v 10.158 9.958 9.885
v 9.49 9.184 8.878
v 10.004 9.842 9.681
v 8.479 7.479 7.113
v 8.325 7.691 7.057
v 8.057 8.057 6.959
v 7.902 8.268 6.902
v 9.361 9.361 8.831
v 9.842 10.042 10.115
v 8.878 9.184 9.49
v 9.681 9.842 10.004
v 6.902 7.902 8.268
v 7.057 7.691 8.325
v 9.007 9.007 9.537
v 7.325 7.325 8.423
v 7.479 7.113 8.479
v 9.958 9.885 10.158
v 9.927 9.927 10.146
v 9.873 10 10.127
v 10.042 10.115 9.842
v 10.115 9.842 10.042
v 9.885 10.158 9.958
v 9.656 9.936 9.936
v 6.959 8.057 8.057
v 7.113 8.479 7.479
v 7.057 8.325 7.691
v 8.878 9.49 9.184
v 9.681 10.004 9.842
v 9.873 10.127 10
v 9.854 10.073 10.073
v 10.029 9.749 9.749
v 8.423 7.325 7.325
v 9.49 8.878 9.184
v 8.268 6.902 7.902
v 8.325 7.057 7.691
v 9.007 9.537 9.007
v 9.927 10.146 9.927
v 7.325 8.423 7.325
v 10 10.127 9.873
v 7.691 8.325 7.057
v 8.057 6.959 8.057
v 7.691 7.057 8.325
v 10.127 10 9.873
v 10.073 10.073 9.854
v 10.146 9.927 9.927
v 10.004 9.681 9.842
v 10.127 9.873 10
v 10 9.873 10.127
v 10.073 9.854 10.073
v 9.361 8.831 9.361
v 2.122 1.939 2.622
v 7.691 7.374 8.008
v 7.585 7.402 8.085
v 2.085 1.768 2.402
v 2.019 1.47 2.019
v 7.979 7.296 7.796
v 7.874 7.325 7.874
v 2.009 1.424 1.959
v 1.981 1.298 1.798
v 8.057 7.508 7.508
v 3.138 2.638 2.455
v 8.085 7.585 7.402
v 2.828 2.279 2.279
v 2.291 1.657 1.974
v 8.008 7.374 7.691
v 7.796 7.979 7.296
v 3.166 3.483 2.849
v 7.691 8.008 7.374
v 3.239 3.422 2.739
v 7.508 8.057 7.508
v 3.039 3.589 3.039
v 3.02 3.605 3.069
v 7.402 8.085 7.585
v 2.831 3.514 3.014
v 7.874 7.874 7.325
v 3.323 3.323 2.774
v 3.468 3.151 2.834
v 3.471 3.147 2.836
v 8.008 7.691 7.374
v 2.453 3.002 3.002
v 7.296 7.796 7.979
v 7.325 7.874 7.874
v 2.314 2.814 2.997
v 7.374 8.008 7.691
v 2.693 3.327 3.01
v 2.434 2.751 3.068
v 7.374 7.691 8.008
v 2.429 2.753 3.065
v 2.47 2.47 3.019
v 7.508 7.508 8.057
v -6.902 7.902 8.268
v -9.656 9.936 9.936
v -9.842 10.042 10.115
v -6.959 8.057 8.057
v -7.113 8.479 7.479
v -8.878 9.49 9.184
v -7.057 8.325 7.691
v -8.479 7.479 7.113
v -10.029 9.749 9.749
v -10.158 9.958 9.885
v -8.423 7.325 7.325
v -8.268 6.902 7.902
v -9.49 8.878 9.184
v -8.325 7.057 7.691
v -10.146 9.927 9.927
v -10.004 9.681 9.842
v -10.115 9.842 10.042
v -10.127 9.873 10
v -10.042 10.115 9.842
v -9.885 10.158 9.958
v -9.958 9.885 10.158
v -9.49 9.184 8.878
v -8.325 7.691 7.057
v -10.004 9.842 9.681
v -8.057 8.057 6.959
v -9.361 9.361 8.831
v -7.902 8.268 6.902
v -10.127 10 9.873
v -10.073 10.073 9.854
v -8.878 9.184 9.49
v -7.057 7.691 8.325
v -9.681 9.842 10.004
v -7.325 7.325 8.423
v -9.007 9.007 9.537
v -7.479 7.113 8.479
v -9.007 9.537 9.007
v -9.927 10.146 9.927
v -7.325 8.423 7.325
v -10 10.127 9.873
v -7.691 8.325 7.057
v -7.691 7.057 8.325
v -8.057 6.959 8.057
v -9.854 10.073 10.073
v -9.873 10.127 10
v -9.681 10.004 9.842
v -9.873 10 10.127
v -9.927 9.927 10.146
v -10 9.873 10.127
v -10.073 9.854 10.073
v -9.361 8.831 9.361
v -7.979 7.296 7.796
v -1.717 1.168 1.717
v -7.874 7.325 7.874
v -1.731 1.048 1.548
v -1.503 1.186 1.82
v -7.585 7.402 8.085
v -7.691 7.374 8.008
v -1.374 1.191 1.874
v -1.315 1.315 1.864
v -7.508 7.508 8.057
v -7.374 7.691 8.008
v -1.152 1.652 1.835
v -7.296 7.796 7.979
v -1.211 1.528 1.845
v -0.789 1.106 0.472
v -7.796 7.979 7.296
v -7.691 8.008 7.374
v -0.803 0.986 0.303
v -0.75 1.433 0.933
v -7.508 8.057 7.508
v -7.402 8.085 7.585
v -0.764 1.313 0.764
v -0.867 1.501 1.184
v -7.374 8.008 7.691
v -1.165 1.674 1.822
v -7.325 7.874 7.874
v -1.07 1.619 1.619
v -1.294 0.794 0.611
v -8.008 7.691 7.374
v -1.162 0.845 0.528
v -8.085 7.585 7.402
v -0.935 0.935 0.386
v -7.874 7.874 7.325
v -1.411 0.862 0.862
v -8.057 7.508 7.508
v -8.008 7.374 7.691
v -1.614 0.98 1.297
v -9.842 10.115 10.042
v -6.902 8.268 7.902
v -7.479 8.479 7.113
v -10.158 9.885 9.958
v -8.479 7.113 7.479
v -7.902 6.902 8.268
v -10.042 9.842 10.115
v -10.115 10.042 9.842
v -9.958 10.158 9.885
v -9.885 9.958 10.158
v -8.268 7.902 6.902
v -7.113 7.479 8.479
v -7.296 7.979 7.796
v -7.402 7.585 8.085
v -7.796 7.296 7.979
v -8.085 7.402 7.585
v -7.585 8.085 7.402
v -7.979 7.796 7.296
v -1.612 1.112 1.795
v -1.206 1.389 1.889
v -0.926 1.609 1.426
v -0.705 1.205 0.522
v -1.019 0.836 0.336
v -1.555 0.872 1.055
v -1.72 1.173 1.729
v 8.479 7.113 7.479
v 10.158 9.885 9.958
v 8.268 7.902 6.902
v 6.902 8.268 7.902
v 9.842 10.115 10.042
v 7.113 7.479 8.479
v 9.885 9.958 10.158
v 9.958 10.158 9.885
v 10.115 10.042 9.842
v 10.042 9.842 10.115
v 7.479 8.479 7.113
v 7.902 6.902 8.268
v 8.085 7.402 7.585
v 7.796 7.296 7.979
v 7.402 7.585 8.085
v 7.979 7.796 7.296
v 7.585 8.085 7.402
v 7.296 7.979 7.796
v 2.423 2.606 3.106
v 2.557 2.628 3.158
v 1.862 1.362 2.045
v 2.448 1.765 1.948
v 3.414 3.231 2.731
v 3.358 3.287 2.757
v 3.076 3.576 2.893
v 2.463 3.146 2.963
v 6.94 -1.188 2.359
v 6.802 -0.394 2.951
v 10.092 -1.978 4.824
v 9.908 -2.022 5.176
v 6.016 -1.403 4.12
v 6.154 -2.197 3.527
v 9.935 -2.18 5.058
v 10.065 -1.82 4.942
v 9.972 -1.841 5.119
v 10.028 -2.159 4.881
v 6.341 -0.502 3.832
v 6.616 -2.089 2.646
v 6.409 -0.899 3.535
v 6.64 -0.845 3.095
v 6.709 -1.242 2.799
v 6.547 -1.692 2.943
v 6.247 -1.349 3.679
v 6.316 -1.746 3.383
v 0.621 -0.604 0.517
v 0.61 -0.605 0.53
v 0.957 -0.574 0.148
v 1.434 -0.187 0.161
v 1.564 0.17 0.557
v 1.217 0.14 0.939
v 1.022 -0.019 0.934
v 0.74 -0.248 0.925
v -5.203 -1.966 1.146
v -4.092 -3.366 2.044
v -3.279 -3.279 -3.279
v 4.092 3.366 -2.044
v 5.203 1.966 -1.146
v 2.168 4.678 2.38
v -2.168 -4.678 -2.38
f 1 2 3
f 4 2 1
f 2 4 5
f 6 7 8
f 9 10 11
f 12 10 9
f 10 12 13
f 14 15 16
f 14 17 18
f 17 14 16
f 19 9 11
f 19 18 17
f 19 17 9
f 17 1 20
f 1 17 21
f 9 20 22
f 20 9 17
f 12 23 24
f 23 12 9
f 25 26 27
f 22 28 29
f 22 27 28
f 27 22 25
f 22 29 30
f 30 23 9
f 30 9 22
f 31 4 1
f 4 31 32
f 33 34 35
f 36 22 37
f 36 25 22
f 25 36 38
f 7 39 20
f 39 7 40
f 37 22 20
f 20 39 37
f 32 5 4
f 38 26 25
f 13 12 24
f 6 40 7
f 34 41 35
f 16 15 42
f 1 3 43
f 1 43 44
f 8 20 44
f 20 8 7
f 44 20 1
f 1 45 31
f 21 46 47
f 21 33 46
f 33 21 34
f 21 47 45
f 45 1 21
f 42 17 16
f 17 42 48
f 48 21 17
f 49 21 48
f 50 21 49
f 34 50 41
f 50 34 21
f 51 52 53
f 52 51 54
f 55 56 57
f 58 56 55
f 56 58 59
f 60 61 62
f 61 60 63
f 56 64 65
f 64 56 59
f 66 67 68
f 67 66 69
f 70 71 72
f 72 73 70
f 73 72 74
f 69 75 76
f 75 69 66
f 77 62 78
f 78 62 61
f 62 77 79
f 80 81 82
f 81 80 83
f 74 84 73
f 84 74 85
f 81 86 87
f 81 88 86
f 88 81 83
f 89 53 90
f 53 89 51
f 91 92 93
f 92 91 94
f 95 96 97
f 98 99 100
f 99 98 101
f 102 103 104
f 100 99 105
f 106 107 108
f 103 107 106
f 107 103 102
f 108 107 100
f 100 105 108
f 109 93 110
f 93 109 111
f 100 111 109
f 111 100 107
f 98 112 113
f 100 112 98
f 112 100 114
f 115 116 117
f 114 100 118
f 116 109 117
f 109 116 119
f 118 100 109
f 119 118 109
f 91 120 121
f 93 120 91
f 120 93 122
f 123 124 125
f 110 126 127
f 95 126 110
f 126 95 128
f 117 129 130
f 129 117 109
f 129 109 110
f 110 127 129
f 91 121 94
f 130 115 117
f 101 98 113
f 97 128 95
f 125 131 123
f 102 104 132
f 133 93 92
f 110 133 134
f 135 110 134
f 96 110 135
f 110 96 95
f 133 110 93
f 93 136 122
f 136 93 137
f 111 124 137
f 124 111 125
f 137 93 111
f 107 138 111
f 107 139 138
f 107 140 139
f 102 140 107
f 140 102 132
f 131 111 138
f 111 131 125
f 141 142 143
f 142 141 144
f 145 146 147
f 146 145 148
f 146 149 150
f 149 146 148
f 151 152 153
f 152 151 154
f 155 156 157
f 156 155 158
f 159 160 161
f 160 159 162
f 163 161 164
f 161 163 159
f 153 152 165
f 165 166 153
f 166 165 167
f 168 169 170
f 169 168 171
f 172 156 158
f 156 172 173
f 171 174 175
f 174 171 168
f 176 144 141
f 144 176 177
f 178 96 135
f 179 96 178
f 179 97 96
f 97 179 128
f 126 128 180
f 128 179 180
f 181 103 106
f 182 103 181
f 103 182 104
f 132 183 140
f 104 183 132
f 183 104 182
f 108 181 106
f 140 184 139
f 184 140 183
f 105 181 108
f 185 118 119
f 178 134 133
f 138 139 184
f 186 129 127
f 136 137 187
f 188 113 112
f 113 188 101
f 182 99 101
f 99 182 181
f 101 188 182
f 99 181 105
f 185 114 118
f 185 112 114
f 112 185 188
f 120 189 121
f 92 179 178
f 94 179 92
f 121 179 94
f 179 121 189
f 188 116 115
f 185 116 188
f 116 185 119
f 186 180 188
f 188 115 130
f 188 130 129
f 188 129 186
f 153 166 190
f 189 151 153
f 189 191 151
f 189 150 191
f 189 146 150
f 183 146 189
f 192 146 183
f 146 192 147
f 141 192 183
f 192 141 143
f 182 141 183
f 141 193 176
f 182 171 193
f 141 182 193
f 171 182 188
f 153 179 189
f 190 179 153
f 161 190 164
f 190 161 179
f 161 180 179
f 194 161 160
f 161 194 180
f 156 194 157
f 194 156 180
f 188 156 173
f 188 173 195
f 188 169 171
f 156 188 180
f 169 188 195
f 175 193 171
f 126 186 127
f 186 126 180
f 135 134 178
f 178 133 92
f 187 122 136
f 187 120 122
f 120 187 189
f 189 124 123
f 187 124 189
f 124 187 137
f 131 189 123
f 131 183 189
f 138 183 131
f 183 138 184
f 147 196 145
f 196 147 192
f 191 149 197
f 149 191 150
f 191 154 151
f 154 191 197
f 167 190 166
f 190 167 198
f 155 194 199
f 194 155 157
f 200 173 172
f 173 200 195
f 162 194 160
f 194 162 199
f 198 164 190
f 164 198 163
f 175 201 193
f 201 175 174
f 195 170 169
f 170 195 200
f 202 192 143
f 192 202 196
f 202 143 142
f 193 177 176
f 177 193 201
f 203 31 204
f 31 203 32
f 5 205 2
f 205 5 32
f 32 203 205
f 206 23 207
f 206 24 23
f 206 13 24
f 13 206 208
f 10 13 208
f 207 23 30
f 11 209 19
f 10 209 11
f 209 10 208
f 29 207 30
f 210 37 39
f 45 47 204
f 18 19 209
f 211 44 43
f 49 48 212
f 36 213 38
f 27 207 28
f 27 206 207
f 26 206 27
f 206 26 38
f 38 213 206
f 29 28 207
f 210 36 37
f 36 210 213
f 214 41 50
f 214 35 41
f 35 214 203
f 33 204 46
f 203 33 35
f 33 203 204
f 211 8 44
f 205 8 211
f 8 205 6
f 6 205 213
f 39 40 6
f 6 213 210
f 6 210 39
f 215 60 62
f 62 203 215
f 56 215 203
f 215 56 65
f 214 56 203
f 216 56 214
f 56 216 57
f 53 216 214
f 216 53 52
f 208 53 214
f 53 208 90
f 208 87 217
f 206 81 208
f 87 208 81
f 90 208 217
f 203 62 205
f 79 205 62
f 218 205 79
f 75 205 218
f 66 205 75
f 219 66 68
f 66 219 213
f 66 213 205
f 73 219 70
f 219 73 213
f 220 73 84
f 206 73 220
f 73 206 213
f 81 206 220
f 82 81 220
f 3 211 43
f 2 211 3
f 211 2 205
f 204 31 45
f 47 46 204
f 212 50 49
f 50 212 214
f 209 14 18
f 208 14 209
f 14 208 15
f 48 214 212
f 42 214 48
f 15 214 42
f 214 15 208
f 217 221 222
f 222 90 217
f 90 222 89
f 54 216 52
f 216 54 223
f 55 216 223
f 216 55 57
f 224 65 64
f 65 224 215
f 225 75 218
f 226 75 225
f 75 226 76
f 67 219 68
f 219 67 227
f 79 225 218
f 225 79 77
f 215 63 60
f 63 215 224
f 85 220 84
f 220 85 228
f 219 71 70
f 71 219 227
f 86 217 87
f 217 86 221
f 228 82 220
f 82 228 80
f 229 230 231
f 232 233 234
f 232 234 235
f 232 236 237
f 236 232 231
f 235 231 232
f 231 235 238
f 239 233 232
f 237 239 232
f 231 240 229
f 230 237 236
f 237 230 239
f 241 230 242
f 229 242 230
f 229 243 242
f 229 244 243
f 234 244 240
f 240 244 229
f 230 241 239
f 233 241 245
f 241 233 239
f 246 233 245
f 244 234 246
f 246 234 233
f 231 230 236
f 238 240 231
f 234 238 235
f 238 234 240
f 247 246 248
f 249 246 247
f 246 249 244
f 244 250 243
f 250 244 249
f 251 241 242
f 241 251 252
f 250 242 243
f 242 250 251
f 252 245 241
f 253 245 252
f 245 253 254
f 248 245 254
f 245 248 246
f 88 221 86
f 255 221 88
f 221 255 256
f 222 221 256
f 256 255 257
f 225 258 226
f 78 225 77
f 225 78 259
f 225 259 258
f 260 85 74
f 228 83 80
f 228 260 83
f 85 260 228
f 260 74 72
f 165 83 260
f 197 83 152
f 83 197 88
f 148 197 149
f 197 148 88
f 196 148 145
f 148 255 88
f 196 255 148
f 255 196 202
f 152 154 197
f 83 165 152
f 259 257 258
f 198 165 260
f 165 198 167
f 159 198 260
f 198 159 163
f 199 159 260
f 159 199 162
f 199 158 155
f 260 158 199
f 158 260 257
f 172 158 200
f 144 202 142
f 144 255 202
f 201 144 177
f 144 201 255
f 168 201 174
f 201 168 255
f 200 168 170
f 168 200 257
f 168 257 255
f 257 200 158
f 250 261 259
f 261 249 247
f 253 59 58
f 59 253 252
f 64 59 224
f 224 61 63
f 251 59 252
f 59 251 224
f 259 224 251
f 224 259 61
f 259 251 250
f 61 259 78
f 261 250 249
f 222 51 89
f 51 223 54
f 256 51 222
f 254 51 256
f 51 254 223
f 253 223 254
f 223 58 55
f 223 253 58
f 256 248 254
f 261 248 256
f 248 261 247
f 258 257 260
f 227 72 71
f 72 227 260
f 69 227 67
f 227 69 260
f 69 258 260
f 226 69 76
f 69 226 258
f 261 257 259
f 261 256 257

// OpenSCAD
//---------------------------------------------------------------
//-- Openscad vector library
//-- This is a component of the obiscad opescad tools by Obijuan
//-- (C) Juan Gonzalez-Gomez (Obijuan)
//-- Sep-2012
//---------------------------------------------------------------
//-- Released under the GPL license
//---------------------------------------------------------------

obiscad_drawing_resolution = 6;

//----------------------------------------
//-- FUNCTIONS FOR WORKING WITH VECTORS
//----------------------------------------

//-- Calculate the module of a vector
function mod(v) = (sqrt(v[0]*v[0]+v[1]*v[1]+v[2]*v[2]));

//-- Calculate the cros product of two vectors
function cross(u,v) = [
  u[1]*v[2] - v[1]*u[2],
  -(u[0]*v[2] - v[0]*u[2]) ,
  u[0]*v[1] - v[0]*u[1]];

//-- Calculate the dot product of two vectors
function dot(u,v) = u[0]*v[0]+u[1]*v[1]+u[2]*v[2];

//-- Return the unit vector of a vector
function unitv(v) = v/mod(v);

//-- Return the angle between two vectores
function anglev(u,v) = acos( dot(u,v) / (mod(u)*mod(v)) );

//----------------------------------------------------------
//--  Draw a point in the position given by the vector p  
//----------------------------------------------------------
module point(p)
{
  translate(p)
    sphere(r=0.7,$fn=obiscad_drawing_resolution);
}

//------------------------------------------------------------------
//-- Draw a vector poiting to the z axis
//-- This is an auxiliary module for implementing the vector module
//--
//-- Parameters:
//--  l: total vector length (line + arrow)
//--  l_arrow: Vector arrow length
//--  mark: If true, a mark is draw in the vector head, for having
//--    a visual reference of the rolling angle
//------------------------------------------------------------------
module vectorz(l=10, l_arrow=4, mark=false)
{
  //-- vector body length (not including the arrow)
  lb = l - l_arrow;

  //-- The vector is locatead at 0,0,0
  translate([0,0,lb/2])
  union() {

    //-- Draw the arrow
    translate([0,0,lb/2])
      cylinder(r1=2/2, r2=0.2, h=l_arrow, $fn=obiscad_drawing_resolution);

    //-- Draw the mark
    if (mark) {
      translate([0,0,lb/2+l_arrow/2])
      translate([1,0,0])
        cube([2,0.3,l_arrow*0.8],center=true);
    }

    //-- Draw the body
    cylinder(r=1/2, h=lb, center=true, $fn=obiscad_drawing_resolution);
  }

  //-- Draw a sphere in the vector base
  sphere(r=1/2, $fn=obiscad_drawing_resolution);
}

//-----------------------------------------------------------------
//-- ORIENTATE OPERATOR
//--
//--  Orientate an object to the direction given by the vector v
//--  Parameters:
//--    v : Target orientation
//--    vref: Vector reference. It is the vector of the local frame
//--          of the object that want to be pointing in the direction
//--          of v
//--    roll: Rotation of the object around the v axis
//-------------------------------------------------------------------
module orientate(v,vref=[0,0,1], roll=0)
{
  //-- Calculate the rotation axis
  raxis = cross(vref,v);
  
  //-- Calculate the angle between the vectors
  ang = anglev(vref,v);

  //-- Rotate the child!
  rotate(a=roll, v=v)
    rotate(a=ang, v=raxis)
      child(0);
}

//---------------------------------------------------------------------------
//-- Draw a vector 
//--
//-- There are two modes of drawing the vector
//-- * Mode 1: Given by a cartesian point(x,y,z). A vector from the origin
//--           to the end (x,y,z) is drawn. The l parameter (length) must 
//--           be 0  (l=0)
//-- * Mode 2: Give by direction and length
//--           A vector of length l pointing to the direction given by
//--           v is drawn
//---------------------------------------------------------------------------
//-- Parameters:
//--  v: Vector cartesian coordinates
//--  l: total vector length (line + arrow)
//--  l_arrow: Vector arrow length
//    mark: If true, a mark is draw in the vector head, for having
//--    a visual reference of the rolling angle
//---------------------------------------------------------------------------
module vector(v,l=0, l_arrow=4, mark=false)
{
  //-- Get the vector length from the coordinates
  mod = mod(v);

  //-- The vector is very easy implemented by means of the orientate
  //-- operator:
  //--  orientate(v) vectorz(l=mod, l_arrow=l_arrow)
  //--  BUT... in OPENSCAD 2012.02.22 the recursion does not
  //--    not work, so that if the user use the orientate operator
  //--    on a vector, openscad will ignore it..
  //-- The solution at the moment (I hope the openscad developers
  //--  implement the recursion in the near future...)
  //--  is to repite the orientate operation in this module

  //---- SAME CALCULATIONS THAN THE ORIENTATE OPERATOR!
  //-- Calculate the rotation axis

  vref = [0,0,1];
  raxis = cross(vref,v);
  
  //-- Calculate the angle between the vectors
  ang = anglev(vref,v);

  //-- orientate the vector
  //-- Draw the vector. The vector length is given either
  //--- by the mod variable (when l=0) or by l (when l!=0)
  if (l==0)
    rotate(a=ang, v=raxis)
      vectorz(l=mod, l_arrow=l_arrow, mark=mark);
  else
    rotate(a=ang, v=raxis)
      vectorz(l=l, l_arrow=l_arrow, mark=mark);

}

//----------------------------------------------------
//-- Draw a Frame of reference
//-- Parameters:
//-- l: length of the Unit vectors
//-----------------------------------------------------
module frame(l=10, l_arrow=4)
{

  //-- Z unit vector
  color("Blue")
    vector([0,0,l], l_arrow=l_arrow);

  //-- X unit vector
  color("Red")
    vector([l,0,0], l_arrow=l_arrow );

  //-- Y unit vector
  color("Green")
    vector([0,l,0],l_arrow=l_arrow);

  //-- Origin
  color("Gray")
    sphere(r=1, $fn=obiscad_drawing_resolution);
}

//--------------------------------------------------
//-- Modules for testings and examples
//-- Testing that the vector library is working ok
//--------------------------------------------------

//-- 22 vectors in total are drawn, poiting to different directions
module Test_vectors1()
{

  a = 20;
  k = 1;

  //--  Add a frame of reference (in the origin)
  frame(l=a);

  //-- Negative vectors, pointing towards the three axis: -x, -y, -z
  color("Red")   vector([-a, 0,  0]);
  color("Green") vector([0, -a,  0]);
  color("Blue")  vector([0,  0, -a]);

  //-- It is *not* has been implemented using a for loop on purpose
  //-- This way, individual vectors can be commented out or highlighted

  //-- vectors with positive z
  vector([a,   a, a*k]);
  vector([0,   a, a*k]);
  vector([-a,  a, a*k]);
  vector([-a,  0, a*k]);

  vector([-a, -a, a*k]);
  vector([0,  -a, a*k]);
  vector([a,  -a, a*k]);
  vector([a,   0, a*k]);


  //-- Vectors with negative z
  vector([a,   a, -a*k]);
  vector([0,   a, -a*k]);
  vector([-a,  a, -a*k]);
  vector([-a,  0, -a*k]);

  vector([-a, -a, -a*k]);
  vector([0,  -a, -a*k]);
  vector([a,  -a, -a*k]);
  vector([a,   0, -a*k]);
}

//--- Another test...
module Test_vectors2()
{

  //-- Add the vector into the vector table
  //-- This vectors are taken as directions
  //-- All the vectors will be drawn with the same length (l)
  vector_table = [
    [1,   1, 1],
    [0,   1, 1],
    [-1,  1, 1],
    [-1,  0, 1],
    [-1, -1, 1],
    [0,  -1, 1],
    [1,  -1, 1],
    [1,   0, 1],
  
    [1,   1, -1],
    [0,   1, -1],
    [-1,  1, -1],
    [-1,  0, -1],
    [-1, -1, -1],
    [0,  -1, -1],
    [1,  -1, -1],
    [1,   0, -1],
  ];

  //-- Vector length
  l=20;

  frame(l=10);

  //-- Draw all the vector given in the table
  //-- The vectors point to the direction given in the table
  //-- They all are drawn with a length equal to l
  for (v=vector_table) {
    //-- Vector given by direction and length
    vector(v,l=l);
  }
}


//-- Test the cross product and the angle
//-- between vectors
module Test_vector3()
{
  //-- Start with 2 unit vectors
  v=unitv([1,1,1]);
  u=unitv([0,1,0]);

  //-- Draw the vector in different colors
  //-- Increase the length for drawing
  color("Red") vector(v*20);
  color("blue") vector(u*20);

  //-- Get the cross product
  w = cross(v,u);
  vector(w*20);

  //-- The cross product is NOT conmutative... 
  //-- change the order of v and u
  w2 = cross(u,v);
  vector(w2*20);

  //-- w should be perpendicular to v and u
  //-- Calculate the angles between them:
  echo("U , V: ", anglev(u,v));
  echo("W , U: ", anglev(w,u));
  echo("W , V: ", anglev(w,v));

}

//-- Test the orientate operator
module Test_vector4()
{
  o = [10,10,10];
  v = [-10,10,10];

  color("Red") vector(o);
  color("Blue") vector(v);

  //-- Orientate the vector o in the direction of v
  orientate(v,o)
    vector(o);

  //-- Inverse operation: orientate the v vector in the direction
  //-- of o
  orientate(o,v)
    vector(v);

  //-- Example of orientation of a cube
  orientate(o,vref=[10,-2,5],roll=0)
    cube([10,2,5],center=true);

  vector([10,-2,5]);

}

//-------- Perform tests......

Test_vector4();


/*

Test_vectors1();


translate([60,0,0]) 
  Test_vectors2();
*/
